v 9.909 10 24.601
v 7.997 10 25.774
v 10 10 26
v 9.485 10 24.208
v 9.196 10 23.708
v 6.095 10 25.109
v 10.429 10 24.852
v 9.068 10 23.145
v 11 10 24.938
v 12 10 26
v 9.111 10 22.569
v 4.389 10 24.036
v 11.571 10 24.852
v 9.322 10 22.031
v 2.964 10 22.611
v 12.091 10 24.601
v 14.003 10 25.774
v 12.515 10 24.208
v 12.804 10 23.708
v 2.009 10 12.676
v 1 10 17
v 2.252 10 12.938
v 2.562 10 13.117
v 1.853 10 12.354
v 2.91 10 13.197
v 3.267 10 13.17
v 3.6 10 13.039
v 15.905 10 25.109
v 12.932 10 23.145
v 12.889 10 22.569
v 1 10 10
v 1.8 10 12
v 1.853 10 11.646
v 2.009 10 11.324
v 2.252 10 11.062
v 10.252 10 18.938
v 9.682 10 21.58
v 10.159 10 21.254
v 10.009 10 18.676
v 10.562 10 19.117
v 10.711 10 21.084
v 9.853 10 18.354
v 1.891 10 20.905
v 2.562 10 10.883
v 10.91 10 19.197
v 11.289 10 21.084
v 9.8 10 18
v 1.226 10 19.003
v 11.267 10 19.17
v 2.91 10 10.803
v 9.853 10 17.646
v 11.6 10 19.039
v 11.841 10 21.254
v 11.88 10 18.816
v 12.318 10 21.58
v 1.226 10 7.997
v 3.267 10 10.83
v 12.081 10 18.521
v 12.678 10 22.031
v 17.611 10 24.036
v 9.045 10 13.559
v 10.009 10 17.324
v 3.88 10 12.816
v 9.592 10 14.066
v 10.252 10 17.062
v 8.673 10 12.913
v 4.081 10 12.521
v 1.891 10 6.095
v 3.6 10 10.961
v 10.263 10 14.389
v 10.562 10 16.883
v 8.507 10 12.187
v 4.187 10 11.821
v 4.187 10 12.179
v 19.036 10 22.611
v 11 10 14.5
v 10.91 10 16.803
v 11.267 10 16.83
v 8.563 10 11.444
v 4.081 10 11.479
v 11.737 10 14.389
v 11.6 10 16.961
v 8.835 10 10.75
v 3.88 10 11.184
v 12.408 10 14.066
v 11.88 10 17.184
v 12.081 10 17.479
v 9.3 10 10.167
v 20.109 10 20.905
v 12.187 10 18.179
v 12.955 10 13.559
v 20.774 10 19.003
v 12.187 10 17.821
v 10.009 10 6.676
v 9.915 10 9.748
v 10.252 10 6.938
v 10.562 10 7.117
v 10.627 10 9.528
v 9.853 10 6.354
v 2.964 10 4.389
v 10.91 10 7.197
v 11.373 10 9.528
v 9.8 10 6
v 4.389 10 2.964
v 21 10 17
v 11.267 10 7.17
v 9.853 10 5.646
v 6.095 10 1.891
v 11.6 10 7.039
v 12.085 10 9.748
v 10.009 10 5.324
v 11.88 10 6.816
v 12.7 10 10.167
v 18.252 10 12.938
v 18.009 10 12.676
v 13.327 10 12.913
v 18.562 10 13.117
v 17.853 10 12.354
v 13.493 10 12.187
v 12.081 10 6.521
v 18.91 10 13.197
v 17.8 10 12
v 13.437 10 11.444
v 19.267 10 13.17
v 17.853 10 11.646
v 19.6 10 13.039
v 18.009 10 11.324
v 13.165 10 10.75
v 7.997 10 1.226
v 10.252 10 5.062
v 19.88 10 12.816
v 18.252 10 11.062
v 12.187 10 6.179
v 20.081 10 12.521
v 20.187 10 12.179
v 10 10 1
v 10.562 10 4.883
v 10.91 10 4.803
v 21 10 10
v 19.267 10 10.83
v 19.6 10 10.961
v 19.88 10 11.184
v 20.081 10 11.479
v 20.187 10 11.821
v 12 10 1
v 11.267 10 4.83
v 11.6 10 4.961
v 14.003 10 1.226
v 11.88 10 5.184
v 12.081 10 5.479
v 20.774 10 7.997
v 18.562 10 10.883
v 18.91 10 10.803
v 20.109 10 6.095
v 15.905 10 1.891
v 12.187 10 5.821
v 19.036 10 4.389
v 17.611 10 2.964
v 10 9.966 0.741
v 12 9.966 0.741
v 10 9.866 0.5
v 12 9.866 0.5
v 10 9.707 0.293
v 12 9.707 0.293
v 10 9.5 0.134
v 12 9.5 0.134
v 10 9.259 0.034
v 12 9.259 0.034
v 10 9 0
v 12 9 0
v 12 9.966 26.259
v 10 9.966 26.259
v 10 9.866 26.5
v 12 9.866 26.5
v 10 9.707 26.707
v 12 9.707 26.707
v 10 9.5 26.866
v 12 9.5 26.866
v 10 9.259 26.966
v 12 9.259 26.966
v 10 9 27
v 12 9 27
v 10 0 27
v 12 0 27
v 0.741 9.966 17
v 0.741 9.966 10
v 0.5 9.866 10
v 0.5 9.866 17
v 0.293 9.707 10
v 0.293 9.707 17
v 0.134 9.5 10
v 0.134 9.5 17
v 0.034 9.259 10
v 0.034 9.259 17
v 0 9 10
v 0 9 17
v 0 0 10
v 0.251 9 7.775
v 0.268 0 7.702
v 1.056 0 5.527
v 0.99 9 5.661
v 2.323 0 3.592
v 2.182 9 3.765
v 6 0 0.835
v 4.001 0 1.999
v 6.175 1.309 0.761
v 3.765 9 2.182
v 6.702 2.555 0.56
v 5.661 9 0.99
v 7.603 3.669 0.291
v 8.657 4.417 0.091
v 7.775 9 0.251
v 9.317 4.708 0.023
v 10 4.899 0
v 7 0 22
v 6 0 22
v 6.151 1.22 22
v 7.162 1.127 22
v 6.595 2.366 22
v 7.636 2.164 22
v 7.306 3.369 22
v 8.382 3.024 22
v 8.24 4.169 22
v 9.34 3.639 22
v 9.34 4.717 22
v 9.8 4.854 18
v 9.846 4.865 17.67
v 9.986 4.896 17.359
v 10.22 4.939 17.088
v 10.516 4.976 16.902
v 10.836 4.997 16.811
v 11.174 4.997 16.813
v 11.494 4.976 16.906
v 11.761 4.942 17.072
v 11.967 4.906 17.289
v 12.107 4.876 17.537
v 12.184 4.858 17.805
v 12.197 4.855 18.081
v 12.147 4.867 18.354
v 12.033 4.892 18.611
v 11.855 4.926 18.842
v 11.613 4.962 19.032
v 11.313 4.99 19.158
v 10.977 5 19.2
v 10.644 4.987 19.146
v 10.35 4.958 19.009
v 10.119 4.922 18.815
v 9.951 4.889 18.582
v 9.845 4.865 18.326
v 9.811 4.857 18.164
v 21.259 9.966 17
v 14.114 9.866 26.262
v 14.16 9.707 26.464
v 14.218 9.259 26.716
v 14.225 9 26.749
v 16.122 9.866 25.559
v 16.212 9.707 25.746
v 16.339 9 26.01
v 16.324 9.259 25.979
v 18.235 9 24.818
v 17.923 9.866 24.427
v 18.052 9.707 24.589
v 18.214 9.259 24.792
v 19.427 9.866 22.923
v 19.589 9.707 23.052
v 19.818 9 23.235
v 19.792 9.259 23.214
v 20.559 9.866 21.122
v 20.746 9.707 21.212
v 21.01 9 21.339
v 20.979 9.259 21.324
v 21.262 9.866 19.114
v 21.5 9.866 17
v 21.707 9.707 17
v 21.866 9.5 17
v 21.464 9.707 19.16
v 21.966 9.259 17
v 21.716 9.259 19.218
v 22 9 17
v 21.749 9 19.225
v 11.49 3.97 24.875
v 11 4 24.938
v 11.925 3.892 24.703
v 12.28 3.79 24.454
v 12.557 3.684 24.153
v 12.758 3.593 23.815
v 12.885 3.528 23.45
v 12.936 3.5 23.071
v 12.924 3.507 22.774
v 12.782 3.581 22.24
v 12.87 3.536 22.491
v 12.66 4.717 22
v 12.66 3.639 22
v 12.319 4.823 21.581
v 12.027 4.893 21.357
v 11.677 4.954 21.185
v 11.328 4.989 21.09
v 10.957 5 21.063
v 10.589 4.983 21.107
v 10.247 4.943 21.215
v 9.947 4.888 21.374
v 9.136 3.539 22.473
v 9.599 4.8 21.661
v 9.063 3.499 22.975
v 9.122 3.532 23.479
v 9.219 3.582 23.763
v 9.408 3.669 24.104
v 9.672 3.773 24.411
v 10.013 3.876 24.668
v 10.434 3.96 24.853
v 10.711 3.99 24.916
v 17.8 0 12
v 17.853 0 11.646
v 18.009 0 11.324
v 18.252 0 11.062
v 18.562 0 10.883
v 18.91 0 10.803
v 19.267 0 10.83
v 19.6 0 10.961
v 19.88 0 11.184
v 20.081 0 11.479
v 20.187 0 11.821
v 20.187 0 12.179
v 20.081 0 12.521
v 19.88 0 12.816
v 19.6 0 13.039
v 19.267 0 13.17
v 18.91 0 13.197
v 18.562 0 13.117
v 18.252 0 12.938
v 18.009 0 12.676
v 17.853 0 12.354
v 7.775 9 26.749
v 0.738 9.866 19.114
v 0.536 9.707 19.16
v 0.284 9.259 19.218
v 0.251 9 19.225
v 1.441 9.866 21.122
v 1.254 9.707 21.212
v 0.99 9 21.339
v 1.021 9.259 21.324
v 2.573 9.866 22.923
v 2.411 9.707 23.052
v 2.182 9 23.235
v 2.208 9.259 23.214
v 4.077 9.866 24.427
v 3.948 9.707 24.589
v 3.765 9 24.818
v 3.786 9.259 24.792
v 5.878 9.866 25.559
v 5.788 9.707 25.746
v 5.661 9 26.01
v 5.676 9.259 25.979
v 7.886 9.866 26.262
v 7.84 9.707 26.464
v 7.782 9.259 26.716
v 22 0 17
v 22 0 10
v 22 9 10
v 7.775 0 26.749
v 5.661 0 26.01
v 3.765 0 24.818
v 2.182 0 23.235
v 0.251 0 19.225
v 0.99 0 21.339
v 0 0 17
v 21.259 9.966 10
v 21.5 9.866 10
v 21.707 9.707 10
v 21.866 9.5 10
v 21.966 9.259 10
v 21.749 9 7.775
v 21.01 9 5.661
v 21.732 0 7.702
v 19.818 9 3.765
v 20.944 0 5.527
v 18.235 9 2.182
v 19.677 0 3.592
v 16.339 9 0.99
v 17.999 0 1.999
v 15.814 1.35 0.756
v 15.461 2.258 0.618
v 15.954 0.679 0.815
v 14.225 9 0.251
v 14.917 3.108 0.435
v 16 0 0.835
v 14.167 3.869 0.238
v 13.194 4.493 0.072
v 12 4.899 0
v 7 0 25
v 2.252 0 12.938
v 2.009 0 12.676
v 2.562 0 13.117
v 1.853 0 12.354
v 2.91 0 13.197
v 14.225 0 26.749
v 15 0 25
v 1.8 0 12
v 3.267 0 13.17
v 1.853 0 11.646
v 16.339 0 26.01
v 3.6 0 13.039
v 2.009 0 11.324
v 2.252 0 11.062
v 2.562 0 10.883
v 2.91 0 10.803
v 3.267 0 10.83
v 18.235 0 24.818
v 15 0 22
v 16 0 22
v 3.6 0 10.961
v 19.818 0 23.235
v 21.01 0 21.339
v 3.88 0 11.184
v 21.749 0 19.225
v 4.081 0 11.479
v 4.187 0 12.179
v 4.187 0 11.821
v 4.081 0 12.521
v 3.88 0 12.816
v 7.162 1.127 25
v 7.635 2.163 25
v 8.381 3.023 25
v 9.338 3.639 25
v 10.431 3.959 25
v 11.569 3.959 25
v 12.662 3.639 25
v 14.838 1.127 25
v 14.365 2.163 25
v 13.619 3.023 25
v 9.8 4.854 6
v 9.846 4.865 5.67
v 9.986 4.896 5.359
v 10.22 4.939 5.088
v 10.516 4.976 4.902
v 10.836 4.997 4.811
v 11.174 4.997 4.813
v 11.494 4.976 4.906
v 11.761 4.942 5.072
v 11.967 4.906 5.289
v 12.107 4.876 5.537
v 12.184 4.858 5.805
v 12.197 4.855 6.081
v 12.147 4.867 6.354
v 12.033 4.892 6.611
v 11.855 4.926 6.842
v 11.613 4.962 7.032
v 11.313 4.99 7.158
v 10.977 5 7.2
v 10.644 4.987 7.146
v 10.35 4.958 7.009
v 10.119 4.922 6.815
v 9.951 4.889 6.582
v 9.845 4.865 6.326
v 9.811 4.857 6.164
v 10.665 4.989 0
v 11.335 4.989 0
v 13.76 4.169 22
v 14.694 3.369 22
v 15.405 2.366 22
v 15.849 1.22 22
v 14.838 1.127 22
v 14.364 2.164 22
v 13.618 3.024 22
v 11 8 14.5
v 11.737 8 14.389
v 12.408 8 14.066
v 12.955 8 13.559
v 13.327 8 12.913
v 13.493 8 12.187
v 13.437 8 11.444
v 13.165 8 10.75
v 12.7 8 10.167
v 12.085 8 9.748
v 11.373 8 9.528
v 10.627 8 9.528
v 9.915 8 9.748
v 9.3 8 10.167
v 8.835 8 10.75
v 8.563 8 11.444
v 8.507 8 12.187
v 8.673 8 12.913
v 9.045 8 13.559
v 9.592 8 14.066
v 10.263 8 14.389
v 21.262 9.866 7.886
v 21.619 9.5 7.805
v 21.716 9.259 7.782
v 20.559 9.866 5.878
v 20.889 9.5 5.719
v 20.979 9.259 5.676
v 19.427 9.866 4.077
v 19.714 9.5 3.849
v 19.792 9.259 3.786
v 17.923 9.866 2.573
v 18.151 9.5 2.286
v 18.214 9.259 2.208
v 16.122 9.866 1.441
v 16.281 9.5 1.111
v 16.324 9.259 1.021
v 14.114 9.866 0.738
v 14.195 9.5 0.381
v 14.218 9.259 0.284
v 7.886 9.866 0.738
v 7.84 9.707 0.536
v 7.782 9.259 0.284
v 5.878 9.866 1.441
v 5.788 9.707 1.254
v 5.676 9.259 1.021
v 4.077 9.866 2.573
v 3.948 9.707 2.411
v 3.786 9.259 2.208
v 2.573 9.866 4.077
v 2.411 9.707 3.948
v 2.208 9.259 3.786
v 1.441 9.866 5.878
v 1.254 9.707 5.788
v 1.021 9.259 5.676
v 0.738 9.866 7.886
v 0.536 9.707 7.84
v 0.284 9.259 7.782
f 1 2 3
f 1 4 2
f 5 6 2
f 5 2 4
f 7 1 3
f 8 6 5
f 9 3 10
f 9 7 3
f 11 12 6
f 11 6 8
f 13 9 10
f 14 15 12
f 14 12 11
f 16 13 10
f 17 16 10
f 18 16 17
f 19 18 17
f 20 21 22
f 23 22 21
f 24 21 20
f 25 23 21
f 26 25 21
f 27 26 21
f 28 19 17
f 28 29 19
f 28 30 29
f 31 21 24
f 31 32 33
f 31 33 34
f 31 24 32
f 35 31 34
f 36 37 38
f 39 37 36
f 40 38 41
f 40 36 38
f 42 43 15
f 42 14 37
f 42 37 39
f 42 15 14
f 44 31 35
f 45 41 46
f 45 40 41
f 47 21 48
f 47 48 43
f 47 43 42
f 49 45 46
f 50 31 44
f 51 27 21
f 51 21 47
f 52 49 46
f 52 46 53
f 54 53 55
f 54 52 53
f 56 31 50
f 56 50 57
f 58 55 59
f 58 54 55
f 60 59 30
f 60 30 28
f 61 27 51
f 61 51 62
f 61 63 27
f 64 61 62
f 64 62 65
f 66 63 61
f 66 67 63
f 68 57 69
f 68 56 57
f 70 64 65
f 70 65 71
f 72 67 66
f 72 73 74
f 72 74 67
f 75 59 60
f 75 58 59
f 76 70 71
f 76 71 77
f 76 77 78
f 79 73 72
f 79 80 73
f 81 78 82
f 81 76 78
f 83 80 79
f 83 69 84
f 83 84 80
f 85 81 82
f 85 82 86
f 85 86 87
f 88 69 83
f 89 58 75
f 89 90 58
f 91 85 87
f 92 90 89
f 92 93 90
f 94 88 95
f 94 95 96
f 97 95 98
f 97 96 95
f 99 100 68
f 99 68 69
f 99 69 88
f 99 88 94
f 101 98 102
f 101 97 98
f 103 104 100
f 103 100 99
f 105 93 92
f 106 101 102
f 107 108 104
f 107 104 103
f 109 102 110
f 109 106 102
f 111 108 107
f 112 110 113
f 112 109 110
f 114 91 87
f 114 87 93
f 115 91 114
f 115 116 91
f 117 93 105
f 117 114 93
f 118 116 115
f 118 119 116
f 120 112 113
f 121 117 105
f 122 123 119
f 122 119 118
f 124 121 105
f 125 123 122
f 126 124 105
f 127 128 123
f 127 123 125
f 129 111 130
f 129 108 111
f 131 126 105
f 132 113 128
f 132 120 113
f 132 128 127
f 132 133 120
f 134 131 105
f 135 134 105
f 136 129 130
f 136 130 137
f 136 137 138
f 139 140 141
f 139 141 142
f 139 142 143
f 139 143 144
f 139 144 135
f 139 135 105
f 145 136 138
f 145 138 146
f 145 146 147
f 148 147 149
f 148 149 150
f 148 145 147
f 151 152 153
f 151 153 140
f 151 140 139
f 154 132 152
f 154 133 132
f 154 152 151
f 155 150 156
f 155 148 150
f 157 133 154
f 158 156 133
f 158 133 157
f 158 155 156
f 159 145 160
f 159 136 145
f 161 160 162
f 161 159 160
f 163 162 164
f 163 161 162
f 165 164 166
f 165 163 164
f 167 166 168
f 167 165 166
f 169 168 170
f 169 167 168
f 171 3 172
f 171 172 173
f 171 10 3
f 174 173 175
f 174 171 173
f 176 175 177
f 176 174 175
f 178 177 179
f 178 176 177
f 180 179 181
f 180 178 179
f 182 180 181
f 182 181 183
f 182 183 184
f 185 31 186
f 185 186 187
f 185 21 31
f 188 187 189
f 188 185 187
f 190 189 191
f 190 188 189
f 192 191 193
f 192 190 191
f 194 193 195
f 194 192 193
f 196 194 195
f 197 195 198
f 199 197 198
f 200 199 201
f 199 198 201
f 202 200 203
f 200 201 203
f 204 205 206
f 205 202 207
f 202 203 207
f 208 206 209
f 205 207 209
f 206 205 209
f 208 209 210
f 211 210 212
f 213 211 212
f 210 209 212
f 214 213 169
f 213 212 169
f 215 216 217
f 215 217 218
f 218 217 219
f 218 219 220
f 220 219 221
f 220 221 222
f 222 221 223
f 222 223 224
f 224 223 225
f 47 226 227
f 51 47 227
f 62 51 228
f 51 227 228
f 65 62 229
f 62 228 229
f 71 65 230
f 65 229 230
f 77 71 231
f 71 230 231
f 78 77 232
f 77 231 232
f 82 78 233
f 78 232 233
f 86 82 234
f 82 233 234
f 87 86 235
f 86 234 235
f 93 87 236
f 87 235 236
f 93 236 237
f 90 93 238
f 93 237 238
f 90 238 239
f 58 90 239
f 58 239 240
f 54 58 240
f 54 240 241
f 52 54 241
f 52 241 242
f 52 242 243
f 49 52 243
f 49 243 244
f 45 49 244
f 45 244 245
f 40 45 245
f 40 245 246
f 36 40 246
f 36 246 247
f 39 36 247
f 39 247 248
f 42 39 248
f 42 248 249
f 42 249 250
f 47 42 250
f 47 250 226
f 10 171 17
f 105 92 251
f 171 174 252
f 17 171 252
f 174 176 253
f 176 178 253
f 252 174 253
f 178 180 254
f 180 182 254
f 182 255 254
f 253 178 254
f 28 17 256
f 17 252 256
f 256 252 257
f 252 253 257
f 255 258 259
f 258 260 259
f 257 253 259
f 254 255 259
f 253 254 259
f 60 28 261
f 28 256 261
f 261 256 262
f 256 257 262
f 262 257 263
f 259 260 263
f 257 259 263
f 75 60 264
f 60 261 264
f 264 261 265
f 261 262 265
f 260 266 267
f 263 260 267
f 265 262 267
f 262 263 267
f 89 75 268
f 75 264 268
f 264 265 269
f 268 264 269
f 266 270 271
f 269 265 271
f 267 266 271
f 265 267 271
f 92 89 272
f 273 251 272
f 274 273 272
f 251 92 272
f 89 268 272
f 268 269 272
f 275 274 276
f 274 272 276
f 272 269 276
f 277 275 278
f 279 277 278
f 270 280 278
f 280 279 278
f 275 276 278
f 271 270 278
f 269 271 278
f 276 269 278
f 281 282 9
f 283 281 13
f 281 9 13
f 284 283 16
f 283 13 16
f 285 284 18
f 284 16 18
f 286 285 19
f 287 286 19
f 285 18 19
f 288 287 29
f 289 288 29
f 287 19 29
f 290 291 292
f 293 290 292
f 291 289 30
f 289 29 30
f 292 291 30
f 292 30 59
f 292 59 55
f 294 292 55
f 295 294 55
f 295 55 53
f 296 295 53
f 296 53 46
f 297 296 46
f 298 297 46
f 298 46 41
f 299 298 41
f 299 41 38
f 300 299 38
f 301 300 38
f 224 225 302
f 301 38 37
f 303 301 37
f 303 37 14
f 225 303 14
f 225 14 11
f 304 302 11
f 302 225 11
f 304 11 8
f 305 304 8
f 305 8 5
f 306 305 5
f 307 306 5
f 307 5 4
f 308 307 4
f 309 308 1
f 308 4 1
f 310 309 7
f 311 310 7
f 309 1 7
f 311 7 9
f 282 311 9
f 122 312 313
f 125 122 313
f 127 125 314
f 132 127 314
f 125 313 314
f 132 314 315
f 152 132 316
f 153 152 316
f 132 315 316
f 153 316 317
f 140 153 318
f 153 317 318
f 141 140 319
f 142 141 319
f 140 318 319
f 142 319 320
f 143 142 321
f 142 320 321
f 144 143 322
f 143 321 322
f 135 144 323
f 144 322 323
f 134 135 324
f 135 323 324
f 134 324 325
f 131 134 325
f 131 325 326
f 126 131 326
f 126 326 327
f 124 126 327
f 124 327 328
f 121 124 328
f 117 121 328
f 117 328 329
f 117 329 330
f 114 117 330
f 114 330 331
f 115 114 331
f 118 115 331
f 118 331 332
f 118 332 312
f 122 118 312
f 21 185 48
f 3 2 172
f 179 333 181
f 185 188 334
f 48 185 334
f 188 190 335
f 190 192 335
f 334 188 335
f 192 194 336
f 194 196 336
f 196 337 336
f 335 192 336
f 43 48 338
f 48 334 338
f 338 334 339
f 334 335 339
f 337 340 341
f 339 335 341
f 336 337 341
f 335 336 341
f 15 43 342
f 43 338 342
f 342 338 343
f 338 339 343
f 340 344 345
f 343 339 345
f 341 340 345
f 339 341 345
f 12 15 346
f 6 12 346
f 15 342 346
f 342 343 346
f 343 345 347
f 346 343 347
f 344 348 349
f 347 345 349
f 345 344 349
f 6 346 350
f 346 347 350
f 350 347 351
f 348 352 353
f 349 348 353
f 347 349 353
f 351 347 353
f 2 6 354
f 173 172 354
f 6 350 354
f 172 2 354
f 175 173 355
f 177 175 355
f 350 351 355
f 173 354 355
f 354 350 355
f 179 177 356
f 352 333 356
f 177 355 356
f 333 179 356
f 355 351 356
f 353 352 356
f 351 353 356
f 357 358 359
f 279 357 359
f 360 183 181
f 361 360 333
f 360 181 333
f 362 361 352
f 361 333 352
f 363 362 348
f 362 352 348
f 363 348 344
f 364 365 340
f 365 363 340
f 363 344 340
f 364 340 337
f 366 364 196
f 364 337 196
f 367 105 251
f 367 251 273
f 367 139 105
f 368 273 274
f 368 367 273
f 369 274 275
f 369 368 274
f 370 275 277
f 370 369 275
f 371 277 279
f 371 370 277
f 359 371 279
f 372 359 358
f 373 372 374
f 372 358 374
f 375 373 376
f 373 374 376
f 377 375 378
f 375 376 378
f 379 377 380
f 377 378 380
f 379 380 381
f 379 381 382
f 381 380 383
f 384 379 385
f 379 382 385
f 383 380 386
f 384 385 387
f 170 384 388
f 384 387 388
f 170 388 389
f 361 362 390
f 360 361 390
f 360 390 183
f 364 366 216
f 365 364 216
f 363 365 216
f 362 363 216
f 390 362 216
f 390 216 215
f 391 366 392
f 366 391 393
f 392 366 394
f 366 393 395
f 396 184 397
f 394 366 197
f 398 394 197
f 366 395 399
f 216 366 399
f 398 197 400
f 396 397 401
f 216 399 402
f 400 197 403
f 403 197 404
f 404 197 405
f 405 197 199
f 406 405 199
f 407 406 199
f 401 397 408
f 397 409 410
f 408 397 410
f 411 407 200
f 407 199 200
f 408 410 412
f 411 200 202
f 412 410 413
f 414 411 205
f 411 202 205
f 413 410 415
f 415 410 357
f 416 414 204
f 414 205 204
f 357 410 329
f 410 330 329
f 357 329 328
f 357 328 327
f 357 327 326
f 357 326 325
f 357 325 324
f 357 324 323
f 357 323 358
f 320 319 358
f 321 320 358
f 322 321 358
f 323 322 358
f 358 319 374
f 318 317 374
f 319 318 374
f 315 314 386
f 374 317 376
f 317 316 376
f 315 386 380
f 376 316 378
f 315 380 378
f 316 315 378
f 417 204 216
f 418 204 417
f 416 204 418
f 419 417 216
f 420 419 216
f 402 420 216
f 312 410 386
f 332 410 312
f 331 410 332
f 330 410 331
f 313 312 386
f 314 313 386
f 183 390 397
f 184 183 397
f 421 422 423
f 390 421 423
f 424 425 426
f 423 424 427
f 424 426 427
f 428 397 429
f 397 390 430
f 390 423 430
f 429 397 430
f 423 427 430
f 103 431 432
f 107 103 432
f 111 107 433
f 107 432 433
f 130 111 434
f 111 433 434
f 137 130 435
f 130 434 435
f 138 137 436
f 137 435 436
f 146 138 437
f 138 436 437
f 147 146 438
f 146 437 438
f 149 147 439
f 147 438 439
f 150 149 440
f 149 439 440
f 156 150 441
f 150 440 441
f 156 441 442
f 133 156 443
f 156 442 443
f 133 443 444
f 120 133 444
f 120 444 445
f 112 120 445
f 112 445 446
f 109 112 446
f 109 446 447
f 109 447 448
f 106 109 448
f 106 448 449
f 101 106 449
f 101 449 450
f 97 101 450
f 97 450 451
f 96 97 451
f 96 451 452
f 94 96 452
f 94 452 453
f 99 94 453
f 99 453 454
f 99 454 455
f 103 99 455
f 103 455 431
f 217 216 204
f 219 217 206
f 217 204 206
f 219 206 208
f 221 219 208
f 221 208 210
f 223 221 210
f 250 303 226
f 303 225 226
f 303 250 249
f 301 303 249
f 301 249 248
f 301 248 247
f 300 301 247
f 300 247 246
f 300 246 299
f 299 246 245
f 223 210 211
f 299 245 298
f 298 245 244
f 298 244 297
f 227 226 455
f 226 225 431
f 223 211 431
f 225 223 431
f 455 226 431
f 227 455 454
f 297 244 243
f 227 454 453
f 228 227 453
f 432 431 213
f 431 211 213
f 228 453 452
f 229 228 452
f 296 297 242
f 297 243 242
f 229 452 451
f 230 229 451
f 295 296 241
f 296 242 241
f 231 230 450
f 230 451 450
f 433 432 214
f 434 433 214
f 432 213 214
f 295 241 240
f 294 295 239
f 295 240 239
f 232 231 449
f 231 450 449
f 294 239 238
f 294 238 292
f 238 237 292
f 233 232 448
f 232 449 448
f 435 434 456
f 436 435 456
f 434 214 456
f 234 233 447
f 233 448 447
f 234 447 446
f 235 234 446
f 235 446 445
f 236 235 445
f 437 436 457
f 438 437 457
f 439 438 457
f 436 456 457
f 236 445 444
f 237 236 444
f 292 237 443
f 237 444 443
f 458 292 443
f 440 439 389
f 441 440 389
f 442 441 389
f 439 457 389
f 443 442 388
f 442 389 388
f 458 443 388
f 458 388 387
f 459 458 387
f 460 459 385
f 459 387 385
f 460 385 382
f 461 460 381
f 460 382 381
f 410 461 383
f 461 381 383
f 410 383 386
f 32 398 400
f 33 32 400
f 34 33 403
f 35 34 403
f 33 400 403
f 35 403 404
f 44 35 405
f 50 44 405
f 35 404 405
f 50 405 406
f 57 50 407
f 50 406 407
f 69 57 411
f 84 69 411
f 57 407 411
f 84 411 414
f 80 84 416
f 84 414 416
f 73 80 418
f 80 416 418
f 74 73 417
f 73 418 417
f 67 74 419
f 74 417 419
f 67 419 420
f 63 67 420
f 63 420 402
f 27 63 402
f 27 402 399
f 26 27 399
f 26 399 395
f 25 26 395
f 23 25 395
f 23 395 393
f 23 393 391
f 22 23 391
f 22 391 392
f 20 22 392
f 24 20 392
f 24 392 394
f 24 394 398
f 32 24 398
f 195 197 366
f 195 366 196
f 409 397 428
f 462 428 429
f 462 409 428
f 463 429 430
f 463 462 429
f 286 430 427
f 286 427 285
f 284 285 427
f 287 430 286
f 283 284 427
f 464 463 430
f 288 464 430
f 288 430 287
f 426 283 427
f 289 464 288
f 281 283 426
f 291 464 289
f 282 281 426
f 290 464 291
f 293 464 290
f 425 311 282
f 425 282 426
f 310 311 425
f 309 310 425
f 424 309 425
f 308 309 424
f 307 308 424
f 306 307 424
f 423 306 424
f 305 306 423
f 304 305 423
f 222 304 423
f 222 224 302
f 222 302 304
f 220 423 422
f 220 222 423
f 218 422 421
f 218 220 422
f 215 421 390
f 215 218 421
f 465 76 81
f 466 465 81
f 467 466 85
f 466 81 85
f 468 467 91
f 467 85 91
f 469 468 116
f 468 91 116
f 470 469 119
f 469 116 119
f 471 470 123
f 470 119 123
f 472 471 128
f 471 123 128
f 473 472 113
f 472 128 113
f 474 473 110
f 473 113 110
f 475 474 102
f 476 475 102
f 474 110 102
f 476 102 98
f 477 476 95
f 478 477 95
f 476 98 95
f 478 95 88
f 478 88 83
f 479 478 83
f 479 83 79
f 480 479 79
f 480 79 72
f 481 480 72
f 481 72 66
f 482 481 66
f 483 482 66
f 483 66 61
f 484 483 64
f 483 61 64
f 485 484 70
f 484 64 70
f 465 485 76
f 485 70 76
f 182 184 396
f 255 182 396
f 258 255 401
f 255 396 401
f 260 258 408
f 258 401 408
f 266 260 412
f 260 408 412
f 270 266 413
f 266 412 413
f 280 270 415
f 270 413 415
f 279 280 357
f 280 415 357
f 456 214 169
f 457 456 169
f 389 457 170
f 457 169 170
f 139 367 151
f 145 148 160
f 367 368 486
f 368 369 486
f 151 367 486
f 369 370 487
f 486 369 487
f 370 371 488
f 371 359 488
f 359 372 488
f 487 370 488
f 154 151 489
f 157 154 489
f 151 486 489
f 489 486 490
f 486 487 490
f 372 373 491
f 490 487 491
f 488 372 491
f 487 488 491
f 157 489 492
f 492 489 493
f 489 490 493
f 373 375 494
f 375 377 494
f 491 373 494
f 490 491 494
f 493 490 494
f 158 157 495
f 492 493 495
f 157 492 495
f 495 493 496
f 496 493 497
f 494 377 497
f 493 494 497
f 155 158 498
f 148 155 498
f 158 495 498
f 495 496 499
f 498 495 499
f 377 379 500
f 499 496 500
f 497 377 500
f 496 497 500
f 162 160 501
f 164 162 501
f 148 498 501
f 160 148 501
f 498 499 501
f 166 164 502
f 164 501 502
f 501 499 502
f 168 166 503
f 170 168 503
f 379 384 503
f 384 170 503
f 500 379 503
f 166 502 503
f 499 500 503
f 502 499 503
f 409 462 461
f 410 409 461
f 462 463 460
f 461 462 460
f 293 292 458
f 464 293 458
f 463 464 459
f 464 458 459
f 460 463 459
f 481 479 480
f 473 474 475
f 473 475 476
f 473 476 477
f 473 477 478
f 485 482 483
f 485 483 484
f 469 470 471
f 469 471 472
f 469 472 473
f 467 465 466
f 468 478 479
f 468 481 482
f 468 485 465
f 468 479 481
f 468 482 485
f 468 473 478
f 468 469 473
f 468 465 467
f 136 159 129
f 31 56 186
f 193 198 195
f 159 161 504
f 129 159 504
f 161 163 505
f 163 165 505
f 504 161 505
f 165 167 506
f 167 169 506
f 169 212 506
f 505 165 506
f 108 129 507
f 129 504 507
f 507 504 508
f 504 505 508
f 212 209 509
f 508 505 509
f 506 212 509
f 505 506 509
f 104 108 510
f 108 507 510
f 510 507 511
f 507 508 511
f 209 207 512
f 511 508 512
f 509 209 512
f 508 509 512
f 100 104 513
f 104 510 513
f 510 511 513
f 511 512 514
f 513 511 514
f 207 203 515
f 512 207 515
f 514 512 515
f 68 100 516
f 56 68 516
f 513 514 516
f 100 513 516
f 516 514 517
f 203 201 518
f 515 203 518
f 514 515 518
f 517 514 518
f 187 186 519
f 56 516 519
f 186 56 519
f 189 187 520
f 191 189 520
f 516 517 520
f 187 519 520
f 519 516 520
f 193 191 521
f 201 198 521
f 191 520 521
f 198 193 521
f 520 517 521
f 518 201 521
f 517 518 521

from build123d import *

# Parameters (mm, degrees)
BOSS_EXTRU_1_DEPTH      = 22
D_GAGEMENT_M21_D        = 2.4
ESQUISSE5_W             = 22
ESQUISSE5_H             = 10
BOSS_EXTRU_2_DEPTH      = 5
CONG_1_R                = 10
CONG_3_R                = 1
ENL_V_MAT_EXTRU_2_DEPTH = 3
ESQUISSE12_R            = 1.9376057
ENL_V_MAT_EXTRU_3_DEPTH = 37.235341952
ESQUISSE13_R            = 2.5
ENL_V_MAT_EXTRU_4_DEPTH = 2


with BuildPart() as part:
    # Esquisse1 → Boss.-Extru.1 (new body)
    with BuildSketch(Plane.XY):
        with BuildLine():
            Line((0, 10), (0, 0))
            Line((0, 0), (6, 0))
            ThreePointArc((6, 0), (11, 5), (16, 0))
            Line((16, 0), (22, 0))
            Line((22, 0), (22, 10))
            Line((22, 10), (0, 10))
        make_face()
    extrude(amount=BOSS_EXTRU_1_DEPTH)

    # Dégagement M21 (through all)
    with Locations(Plane(origin=(0, 10, 0), x_dir=(1, 0, 0), z_dir=(0, 1, 0))):
        with Locations((11, -6), (11, -18), (3, -12), (19, -12)):
            Hole(D_GAGEMENT_M21_D / 2)

    # Esquisse5 → Boss.-Extru.2 (add)
    with BuildSketch(Plane.XY.offset(22)):
        with Locations((11, 5)):
            Rectangle(ESQUISSE5_W, ESQUISSE5_H)
    extrude(amount=BOSS_EXTRU_2_DEPTH)

    # Congé1
    # the kernel refuses this fillet: 10 mm, written as the material it takes off along each edge
    with BuildSketch(Plane(origin=(0, 35, 0), x_dir=(0, 0, 1), z_dir=(0, -1, 0))) as cong_1_piece_1:
        with BuildLine():
            CenterArc((CONG_1_R, -CONG_1_R), CONG_1_R, 90, 90)
            Line((0, -CONG_1_R), (0, 0))
            Line((0, 0), (CONG_1_R, 0))
        make_face()
    extrude(amount=60, mode=Mode.SUBTRACT)
    with BuildSketch(Plane(origin=(0, 35, 27), x_dir=(0, 0, -1), z_dir=(0, -1, 0)), Plane(origin=(22, -25, 0), x_dir=(-1, 0, 0), z_dir=(0, 1, 0)), Plane(origin=(22, -25, 27), x_dir=(0, 0, -1), z_dir=(0, 1, 0))) as cong_1_piece_2:
        with BuildLine():
            CenterArc((CONG_1_R, CONG_1_R), CONG_1_R, 180, 90)
            Line((0, CONG_1_R), (0, 0))
            Line((0, 0), (CONG_1_R, 0))
        make_face()
    extrude(amount=60, mode=Mode.SUBTRACT)

    # Congé3
    cong_3_edges = [part.edges().sort_by_distance(p)[0] for p in [
        (11, 10, 0),
        (0, 10, 13.5),
        (11, 10, 27),
        (22, 10, 13.5),
        (19.071067812, 10, 24.071067812),
        (19.071067812, 10, 2.928932188),
        (2.928932188, 10, 24.071067812),
        (2.928932188, 10, 2.928932188),
    ]]
    fillet(cong_3_edges, radius=CONG_3_R)

    # Esquisse10 → Enlèv. mat.-Extru.2 (cut)
    with BuildSketch(Plane(origin=(0, 0, 22), x_dir=(-1, 0, 0), z_dir=(0, 0, -1))):
        with BuildLine():
            Line((-7, 0), (-15, 0))
            ThreePointArc((-15, 0), (-11, 4), (-7, 0))
        make_face()
    extrude(amount=-ENL_V_MAT_EXTRU_2_DEPTH, mode=Mode.SUBTRACT)

    # Esquisse12 → Enlèv. mat.-Extru.3 (cut, through all)
    with BuildSketch(Plane(origin=(0, 10, 0), x_dir=(1, 0, 0), z_dir=(0, 1, 0))):
        with Locations(Location((11, -23, 0), (0, 0, 270))):
            Circle(ESQUISSE12_R)
    extrude(amount=-ENL_V_MAT_EXTRU_3_DEPTH, mode=Mode.SUBTRACT)

    # Esquisse13 → Enlèv. mat.-Extru.4 (cut)
    with BuildSketch(Plane(origin=(0, 10, 0), x_dir=(1, 0, 0), z_dir=(0, 1, 0))):
        with Locations(Location((11, -12, 0), (0, 0, 270))):
            Circle(ESQUISSE13_R)
    extrude(amount=-ENL_V_MAT_EXTRU_4_DEPTH, mode=Mode.SUBTRACT)


solid = part.part
